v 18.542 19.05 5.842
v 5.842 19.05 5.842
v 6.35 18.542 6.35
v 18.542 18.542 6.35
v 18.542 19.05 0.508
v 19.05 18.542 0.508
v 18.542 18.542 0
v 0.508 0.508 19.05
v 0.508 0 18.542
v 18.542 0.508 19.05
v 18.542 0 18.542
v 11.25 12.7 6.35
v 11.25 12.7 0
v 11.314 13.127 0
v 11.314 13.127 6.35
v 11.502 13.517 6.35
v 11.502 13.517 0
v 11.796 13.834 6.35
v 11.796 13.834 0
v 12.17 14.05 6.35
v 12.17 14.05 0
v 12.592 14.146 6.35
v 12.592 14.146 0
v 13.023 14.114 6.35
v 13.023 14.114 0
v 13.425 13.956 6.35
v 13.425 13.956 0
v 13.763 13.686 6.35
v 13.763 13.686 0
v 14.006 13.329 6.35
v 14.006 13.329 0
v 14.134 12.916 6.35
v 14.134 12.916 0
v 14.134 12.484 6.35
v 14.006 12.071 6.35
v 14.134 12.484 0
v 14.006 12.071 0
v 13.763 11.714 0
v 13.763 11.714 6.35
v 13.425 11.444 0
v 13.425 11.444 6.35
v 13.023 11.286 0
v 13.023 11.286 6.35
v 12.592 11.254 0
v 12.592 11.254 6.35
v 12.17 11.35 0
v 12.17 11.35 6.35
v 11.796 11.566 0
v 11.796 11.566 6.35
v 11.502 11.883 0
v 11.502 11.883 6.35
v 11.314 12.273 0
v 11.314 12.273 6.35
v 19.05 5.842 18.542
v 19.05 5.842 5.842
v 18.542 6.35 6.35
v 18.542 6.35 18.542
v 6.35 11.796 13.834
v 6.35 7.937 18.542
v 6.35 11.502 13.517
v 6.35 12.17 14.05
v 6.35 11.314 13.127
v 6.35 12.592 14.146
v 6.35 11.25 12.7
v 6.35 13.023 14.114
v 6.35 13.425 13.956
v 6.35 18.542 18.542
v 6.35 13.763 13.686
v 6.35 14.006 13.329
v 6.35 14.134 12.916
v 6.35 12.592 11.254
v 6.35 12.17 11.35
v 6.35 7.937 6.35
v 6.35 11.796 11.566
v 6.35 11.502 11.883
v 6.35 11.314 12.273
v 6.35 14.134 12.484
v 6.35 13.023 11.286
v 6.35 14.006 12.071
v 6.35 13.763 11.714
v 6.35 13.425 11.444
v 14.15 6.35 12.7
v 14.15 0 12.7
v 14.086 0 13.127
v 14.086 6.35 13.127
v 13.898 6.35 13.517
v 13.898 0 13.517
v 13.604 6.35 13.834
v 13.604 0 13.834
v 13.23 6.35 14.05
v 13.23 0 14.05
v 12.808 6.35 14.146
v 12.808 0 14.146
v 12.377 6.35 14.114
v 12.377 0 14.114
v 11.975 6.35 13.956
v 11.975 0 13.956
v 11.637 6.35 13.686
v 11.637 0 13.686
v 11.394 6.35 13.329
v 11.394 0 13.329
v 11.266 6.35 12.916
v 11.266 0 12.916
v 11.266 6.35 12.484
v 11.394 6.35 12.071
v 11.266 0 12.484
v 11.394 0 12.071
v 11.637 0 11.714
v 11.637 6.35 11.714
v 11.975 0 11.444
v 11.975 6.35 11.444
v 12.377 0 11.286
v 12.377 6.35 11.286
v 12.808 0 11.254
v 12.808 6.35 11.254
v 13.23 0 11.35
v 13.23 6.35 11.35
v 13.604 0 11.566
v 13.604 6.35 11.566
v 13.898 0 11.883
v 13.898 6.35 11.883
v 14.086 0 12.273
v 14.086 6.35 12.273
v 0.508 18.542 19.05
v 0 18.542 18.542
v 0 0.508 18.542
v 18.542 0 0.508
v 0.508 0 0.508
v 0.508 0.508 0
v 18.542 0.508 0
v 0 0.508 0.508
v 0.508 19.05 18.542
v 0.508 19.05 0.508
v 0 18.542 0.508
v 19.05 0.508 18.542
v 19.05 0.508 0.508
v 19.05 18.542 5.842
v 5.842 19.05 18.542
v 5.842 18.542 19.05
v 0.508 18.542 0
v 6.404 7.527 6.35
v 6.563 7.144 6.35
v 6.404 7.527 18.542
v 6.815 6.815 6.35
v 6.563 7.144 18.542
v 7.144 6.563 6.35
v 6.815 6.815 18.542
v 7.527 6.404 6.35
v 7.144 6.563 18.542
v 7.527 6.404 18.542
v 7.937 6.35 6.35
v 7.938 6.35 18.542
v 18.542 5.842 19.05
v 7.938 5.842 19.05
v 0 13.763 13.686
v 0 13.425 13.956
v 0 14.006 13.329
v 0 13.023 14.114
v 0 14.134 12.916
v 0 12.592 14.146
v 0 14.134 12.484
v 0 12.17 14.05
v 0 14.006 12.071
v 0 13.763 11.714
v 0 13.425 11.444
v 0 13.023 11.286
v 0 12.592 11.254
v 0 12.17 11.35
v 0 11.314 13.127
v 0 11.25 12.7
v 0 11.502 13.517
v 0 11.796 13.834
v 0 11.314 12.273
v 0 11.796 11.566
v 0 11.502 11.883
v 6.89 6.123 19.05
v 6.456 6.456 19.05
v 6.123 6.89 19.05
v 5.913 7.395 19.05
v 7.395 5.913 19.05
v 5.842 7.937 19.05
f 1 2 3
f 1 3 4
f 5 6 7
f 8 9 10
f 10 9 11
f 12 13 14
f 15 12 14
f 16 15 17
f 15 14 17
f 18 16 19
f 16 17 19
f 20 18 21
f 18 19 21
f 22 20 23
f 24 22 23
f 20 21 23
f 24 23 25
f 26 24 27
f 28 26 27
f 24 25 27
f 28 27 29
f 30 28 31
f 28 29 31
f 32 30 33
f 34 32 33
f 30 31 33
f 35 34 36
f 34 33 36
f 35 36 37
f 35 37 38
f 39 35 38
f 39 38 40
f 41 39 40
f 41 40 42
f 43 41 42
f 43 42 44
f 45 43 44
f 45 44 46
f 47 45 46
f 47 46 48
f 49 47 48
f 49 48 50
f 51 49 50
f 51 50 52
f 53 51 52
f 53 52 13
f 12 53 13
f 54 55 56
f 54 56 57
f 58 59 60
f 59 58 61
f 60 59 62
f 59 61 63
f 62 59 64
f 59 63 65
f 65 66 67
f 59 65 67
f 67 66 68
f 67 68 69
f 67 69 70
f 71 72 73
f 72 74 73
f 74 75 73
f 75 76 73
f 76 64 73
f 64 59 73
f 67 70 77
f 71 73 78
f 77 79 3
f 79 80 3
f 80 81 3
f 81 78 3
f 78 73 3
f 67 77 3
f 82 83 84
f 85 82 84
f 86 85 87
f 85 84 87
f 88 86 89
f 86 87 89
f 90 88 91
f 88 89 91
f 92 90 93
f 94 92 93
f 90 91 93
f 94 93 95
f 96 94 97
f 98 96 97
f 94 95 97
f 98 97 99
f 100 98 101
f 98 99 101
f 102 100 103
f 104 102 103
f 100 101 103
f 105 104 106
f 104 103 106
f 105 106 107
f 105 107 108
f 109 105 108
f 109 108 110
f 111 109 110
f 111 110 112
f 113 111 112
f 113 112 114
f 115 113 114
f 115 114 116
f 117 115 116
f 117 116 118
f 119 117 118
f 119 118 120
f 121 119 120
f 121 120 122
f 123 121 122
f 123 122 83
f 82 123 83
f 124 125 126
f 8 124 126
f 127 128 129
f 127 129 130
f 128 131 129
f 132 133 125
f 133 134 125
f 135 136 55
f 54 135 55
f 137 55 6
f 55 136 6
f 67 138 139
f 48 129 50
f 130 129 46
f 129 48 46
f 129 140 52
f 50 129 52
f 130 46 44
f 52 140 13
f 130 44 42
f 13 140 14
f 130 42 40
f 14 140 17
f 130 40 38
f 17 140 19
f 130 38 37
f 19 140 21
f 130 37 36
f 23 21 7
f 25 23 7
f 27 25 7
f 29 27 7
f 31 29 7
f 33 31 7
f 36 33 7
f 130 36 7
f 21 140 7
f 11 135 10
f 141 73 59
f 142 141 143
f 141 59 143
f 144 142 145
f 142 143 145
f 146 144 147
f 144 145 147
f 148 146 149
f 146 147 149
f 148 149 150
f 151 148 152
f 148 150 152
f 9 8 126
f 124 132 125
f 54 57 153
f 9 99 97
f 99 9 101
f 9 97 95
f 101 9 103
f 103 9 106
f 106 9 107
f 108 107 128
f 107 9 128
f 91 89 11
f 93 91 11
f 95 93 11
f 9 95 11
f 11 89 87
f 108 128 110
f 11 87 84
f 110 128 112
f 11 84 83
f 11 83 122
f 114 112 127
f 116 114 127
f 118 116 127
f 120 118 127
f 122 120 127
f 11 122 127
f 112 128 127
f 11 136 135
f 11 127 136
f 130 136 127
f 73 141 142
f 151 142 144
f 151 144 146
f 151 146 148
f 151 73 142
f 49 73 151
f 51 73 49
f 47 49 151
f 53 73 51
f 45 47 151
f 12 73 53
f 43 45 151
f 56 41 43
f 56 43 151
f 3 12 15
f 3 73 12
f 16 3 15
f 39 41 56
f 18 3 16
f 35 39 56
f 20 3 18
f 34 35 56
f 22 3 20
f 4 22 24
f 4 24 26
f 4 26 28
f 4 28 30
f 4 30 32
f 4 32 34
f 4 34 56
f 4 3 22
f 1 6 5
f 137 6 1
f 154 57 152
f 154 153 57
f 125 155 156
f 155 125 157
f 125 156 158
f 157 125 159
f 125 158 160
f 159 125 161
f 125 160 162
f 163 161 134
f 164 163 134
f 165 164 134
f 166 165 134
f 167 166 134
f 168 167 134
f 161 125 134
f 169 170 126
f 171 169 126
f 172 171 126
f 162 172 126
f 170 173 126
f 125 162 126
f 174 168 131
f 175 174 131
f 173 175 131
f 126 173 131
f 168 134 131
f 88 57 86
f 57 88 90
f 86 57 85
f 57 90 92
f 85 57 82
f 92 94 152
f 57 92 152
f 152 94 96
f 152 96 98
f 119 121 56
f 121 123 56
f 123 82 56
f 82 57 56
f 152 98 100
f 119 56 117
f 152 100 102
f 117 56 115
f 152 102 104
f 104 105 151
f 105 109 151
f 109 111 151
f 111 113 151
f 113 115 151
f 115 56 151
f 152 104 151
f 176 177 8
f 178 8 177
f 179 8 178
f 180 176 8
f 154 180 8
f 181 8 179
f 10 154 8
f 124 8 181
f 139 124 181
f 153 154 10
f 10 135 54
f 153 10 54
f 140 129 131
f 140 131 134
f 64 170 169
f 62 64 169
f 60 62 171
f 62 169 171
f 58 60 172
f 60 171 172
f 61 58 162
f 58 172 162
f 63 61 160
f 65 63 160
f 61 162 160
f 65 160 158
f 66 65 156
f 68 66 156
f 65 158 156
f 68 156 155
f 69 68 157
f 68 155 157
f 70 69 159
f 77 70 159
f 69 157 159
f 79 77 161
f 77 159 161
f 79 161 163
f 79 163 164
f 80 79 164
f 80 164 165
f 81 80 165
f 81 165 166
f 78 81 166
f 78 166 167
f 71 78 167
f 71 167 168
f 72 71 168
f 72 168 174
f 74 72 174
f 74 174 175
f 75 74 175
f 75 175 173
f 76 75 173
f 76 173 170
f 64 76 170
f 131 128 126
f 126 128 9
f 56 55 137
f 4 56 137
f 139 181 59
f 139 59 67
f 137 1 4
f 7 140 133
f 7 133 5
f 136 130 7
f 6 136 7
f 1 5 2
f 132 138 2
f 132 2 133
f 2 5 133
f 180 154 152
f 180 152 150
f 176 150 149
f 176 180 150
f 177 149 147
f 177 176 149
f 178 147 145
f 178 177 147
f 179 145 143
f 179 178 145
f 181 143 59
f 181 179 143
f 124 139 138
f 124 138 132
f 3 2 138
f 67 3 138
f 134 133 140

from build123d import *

# Parameters (mm, degrees)
F0_W       = 19.05
F0_H       = 19.05
F1_DEPTH   = 6.35
F3_DEPTH   = 12.7
F7_D       = 2.9
F7_ON_F6_D = 2.9
F7_ON_F5_D = 2.9
F8_R       = 1.5875
F9_SIZE    = 0.508


with BuildPart() as f1:
    # F0 (on Top) → F1 (new body)
    with BuildSketch(Plane.XY):
        with Locations((9.525, 9.525)):
            Rectangle(F0_W, F0_H)
    extrude(amount=F1_DEPTH)

    # F2 (on face) → F3 (join)
    with BuildSketch(Plane.XY.offset(6.35)):
        Polygon((6.35, 19.05), (0, 19.05), (0, 0), (19.05, 0), (19.05, 6.35), (6.35, 6.35), align=None)
    extrude(amount=F3_DEPTH)

    # F7 (through all)
    with Locations(Plane.YZ.offset(6.35)):
        with Locations((12.7, 12.7)):
            Hole(F7_D / 2)

    # F7 on F6 (through all)
    with Locations(Plane(origin=(0, 6.35, 0), x_dir=(-1, 0, 0), z_dir=(0, 1, 0))):
        with Locations((-12.7, 12.7)):
            Hole(F7_ON_F6_D / 2)

    # F7 on F5 (through all)
    with Locations(Plane.XY.offset(6.35)):
        with Locations((12.7, 12.7)):
            Hole(F7_ON_F5_D / 2)

    # F8
    f8_edges = [f1.edges().sort_by_distance(p)[0] for p in [
        (6.35, 6.35, 12.7),
    ]]
    fillet(f8_edges, radius=F8_R)

    # F9
    f9_edges = [f1.edges().sort_by_distance(p)[0] for p in [
        (19.05, 19.05, 3.175),
        (12.7, 19.05, 6.35),
        (6.35, 19.05, 12.7),
        (0, 19.05, 9.525),
        (3.175, 19.05, 19.05),
        (6.35, 13.49375, 19.05),
        (19.05, 6.35, 12.7),
        (19.05, 12.7, 6.35),
        (19.05, 0, 9.525),
        (19.05, 3.175, 19.05),
        (13.49375, 6.35, 19.05),
        (6.814968, 6.814968, 19.05),
        (9.525, 0, 19.05),
        (0, 9.525, 19.05),
        (0, 0, 9.525),
        (19.05, 9.525, 0),
        (9.525, 19.05, 0),
        (0, 9.525, 0),
        (9.525, 0, 0),
    ]]
    chamfer(f9_edges, length=F9_SIZE)


solid = f1.part
